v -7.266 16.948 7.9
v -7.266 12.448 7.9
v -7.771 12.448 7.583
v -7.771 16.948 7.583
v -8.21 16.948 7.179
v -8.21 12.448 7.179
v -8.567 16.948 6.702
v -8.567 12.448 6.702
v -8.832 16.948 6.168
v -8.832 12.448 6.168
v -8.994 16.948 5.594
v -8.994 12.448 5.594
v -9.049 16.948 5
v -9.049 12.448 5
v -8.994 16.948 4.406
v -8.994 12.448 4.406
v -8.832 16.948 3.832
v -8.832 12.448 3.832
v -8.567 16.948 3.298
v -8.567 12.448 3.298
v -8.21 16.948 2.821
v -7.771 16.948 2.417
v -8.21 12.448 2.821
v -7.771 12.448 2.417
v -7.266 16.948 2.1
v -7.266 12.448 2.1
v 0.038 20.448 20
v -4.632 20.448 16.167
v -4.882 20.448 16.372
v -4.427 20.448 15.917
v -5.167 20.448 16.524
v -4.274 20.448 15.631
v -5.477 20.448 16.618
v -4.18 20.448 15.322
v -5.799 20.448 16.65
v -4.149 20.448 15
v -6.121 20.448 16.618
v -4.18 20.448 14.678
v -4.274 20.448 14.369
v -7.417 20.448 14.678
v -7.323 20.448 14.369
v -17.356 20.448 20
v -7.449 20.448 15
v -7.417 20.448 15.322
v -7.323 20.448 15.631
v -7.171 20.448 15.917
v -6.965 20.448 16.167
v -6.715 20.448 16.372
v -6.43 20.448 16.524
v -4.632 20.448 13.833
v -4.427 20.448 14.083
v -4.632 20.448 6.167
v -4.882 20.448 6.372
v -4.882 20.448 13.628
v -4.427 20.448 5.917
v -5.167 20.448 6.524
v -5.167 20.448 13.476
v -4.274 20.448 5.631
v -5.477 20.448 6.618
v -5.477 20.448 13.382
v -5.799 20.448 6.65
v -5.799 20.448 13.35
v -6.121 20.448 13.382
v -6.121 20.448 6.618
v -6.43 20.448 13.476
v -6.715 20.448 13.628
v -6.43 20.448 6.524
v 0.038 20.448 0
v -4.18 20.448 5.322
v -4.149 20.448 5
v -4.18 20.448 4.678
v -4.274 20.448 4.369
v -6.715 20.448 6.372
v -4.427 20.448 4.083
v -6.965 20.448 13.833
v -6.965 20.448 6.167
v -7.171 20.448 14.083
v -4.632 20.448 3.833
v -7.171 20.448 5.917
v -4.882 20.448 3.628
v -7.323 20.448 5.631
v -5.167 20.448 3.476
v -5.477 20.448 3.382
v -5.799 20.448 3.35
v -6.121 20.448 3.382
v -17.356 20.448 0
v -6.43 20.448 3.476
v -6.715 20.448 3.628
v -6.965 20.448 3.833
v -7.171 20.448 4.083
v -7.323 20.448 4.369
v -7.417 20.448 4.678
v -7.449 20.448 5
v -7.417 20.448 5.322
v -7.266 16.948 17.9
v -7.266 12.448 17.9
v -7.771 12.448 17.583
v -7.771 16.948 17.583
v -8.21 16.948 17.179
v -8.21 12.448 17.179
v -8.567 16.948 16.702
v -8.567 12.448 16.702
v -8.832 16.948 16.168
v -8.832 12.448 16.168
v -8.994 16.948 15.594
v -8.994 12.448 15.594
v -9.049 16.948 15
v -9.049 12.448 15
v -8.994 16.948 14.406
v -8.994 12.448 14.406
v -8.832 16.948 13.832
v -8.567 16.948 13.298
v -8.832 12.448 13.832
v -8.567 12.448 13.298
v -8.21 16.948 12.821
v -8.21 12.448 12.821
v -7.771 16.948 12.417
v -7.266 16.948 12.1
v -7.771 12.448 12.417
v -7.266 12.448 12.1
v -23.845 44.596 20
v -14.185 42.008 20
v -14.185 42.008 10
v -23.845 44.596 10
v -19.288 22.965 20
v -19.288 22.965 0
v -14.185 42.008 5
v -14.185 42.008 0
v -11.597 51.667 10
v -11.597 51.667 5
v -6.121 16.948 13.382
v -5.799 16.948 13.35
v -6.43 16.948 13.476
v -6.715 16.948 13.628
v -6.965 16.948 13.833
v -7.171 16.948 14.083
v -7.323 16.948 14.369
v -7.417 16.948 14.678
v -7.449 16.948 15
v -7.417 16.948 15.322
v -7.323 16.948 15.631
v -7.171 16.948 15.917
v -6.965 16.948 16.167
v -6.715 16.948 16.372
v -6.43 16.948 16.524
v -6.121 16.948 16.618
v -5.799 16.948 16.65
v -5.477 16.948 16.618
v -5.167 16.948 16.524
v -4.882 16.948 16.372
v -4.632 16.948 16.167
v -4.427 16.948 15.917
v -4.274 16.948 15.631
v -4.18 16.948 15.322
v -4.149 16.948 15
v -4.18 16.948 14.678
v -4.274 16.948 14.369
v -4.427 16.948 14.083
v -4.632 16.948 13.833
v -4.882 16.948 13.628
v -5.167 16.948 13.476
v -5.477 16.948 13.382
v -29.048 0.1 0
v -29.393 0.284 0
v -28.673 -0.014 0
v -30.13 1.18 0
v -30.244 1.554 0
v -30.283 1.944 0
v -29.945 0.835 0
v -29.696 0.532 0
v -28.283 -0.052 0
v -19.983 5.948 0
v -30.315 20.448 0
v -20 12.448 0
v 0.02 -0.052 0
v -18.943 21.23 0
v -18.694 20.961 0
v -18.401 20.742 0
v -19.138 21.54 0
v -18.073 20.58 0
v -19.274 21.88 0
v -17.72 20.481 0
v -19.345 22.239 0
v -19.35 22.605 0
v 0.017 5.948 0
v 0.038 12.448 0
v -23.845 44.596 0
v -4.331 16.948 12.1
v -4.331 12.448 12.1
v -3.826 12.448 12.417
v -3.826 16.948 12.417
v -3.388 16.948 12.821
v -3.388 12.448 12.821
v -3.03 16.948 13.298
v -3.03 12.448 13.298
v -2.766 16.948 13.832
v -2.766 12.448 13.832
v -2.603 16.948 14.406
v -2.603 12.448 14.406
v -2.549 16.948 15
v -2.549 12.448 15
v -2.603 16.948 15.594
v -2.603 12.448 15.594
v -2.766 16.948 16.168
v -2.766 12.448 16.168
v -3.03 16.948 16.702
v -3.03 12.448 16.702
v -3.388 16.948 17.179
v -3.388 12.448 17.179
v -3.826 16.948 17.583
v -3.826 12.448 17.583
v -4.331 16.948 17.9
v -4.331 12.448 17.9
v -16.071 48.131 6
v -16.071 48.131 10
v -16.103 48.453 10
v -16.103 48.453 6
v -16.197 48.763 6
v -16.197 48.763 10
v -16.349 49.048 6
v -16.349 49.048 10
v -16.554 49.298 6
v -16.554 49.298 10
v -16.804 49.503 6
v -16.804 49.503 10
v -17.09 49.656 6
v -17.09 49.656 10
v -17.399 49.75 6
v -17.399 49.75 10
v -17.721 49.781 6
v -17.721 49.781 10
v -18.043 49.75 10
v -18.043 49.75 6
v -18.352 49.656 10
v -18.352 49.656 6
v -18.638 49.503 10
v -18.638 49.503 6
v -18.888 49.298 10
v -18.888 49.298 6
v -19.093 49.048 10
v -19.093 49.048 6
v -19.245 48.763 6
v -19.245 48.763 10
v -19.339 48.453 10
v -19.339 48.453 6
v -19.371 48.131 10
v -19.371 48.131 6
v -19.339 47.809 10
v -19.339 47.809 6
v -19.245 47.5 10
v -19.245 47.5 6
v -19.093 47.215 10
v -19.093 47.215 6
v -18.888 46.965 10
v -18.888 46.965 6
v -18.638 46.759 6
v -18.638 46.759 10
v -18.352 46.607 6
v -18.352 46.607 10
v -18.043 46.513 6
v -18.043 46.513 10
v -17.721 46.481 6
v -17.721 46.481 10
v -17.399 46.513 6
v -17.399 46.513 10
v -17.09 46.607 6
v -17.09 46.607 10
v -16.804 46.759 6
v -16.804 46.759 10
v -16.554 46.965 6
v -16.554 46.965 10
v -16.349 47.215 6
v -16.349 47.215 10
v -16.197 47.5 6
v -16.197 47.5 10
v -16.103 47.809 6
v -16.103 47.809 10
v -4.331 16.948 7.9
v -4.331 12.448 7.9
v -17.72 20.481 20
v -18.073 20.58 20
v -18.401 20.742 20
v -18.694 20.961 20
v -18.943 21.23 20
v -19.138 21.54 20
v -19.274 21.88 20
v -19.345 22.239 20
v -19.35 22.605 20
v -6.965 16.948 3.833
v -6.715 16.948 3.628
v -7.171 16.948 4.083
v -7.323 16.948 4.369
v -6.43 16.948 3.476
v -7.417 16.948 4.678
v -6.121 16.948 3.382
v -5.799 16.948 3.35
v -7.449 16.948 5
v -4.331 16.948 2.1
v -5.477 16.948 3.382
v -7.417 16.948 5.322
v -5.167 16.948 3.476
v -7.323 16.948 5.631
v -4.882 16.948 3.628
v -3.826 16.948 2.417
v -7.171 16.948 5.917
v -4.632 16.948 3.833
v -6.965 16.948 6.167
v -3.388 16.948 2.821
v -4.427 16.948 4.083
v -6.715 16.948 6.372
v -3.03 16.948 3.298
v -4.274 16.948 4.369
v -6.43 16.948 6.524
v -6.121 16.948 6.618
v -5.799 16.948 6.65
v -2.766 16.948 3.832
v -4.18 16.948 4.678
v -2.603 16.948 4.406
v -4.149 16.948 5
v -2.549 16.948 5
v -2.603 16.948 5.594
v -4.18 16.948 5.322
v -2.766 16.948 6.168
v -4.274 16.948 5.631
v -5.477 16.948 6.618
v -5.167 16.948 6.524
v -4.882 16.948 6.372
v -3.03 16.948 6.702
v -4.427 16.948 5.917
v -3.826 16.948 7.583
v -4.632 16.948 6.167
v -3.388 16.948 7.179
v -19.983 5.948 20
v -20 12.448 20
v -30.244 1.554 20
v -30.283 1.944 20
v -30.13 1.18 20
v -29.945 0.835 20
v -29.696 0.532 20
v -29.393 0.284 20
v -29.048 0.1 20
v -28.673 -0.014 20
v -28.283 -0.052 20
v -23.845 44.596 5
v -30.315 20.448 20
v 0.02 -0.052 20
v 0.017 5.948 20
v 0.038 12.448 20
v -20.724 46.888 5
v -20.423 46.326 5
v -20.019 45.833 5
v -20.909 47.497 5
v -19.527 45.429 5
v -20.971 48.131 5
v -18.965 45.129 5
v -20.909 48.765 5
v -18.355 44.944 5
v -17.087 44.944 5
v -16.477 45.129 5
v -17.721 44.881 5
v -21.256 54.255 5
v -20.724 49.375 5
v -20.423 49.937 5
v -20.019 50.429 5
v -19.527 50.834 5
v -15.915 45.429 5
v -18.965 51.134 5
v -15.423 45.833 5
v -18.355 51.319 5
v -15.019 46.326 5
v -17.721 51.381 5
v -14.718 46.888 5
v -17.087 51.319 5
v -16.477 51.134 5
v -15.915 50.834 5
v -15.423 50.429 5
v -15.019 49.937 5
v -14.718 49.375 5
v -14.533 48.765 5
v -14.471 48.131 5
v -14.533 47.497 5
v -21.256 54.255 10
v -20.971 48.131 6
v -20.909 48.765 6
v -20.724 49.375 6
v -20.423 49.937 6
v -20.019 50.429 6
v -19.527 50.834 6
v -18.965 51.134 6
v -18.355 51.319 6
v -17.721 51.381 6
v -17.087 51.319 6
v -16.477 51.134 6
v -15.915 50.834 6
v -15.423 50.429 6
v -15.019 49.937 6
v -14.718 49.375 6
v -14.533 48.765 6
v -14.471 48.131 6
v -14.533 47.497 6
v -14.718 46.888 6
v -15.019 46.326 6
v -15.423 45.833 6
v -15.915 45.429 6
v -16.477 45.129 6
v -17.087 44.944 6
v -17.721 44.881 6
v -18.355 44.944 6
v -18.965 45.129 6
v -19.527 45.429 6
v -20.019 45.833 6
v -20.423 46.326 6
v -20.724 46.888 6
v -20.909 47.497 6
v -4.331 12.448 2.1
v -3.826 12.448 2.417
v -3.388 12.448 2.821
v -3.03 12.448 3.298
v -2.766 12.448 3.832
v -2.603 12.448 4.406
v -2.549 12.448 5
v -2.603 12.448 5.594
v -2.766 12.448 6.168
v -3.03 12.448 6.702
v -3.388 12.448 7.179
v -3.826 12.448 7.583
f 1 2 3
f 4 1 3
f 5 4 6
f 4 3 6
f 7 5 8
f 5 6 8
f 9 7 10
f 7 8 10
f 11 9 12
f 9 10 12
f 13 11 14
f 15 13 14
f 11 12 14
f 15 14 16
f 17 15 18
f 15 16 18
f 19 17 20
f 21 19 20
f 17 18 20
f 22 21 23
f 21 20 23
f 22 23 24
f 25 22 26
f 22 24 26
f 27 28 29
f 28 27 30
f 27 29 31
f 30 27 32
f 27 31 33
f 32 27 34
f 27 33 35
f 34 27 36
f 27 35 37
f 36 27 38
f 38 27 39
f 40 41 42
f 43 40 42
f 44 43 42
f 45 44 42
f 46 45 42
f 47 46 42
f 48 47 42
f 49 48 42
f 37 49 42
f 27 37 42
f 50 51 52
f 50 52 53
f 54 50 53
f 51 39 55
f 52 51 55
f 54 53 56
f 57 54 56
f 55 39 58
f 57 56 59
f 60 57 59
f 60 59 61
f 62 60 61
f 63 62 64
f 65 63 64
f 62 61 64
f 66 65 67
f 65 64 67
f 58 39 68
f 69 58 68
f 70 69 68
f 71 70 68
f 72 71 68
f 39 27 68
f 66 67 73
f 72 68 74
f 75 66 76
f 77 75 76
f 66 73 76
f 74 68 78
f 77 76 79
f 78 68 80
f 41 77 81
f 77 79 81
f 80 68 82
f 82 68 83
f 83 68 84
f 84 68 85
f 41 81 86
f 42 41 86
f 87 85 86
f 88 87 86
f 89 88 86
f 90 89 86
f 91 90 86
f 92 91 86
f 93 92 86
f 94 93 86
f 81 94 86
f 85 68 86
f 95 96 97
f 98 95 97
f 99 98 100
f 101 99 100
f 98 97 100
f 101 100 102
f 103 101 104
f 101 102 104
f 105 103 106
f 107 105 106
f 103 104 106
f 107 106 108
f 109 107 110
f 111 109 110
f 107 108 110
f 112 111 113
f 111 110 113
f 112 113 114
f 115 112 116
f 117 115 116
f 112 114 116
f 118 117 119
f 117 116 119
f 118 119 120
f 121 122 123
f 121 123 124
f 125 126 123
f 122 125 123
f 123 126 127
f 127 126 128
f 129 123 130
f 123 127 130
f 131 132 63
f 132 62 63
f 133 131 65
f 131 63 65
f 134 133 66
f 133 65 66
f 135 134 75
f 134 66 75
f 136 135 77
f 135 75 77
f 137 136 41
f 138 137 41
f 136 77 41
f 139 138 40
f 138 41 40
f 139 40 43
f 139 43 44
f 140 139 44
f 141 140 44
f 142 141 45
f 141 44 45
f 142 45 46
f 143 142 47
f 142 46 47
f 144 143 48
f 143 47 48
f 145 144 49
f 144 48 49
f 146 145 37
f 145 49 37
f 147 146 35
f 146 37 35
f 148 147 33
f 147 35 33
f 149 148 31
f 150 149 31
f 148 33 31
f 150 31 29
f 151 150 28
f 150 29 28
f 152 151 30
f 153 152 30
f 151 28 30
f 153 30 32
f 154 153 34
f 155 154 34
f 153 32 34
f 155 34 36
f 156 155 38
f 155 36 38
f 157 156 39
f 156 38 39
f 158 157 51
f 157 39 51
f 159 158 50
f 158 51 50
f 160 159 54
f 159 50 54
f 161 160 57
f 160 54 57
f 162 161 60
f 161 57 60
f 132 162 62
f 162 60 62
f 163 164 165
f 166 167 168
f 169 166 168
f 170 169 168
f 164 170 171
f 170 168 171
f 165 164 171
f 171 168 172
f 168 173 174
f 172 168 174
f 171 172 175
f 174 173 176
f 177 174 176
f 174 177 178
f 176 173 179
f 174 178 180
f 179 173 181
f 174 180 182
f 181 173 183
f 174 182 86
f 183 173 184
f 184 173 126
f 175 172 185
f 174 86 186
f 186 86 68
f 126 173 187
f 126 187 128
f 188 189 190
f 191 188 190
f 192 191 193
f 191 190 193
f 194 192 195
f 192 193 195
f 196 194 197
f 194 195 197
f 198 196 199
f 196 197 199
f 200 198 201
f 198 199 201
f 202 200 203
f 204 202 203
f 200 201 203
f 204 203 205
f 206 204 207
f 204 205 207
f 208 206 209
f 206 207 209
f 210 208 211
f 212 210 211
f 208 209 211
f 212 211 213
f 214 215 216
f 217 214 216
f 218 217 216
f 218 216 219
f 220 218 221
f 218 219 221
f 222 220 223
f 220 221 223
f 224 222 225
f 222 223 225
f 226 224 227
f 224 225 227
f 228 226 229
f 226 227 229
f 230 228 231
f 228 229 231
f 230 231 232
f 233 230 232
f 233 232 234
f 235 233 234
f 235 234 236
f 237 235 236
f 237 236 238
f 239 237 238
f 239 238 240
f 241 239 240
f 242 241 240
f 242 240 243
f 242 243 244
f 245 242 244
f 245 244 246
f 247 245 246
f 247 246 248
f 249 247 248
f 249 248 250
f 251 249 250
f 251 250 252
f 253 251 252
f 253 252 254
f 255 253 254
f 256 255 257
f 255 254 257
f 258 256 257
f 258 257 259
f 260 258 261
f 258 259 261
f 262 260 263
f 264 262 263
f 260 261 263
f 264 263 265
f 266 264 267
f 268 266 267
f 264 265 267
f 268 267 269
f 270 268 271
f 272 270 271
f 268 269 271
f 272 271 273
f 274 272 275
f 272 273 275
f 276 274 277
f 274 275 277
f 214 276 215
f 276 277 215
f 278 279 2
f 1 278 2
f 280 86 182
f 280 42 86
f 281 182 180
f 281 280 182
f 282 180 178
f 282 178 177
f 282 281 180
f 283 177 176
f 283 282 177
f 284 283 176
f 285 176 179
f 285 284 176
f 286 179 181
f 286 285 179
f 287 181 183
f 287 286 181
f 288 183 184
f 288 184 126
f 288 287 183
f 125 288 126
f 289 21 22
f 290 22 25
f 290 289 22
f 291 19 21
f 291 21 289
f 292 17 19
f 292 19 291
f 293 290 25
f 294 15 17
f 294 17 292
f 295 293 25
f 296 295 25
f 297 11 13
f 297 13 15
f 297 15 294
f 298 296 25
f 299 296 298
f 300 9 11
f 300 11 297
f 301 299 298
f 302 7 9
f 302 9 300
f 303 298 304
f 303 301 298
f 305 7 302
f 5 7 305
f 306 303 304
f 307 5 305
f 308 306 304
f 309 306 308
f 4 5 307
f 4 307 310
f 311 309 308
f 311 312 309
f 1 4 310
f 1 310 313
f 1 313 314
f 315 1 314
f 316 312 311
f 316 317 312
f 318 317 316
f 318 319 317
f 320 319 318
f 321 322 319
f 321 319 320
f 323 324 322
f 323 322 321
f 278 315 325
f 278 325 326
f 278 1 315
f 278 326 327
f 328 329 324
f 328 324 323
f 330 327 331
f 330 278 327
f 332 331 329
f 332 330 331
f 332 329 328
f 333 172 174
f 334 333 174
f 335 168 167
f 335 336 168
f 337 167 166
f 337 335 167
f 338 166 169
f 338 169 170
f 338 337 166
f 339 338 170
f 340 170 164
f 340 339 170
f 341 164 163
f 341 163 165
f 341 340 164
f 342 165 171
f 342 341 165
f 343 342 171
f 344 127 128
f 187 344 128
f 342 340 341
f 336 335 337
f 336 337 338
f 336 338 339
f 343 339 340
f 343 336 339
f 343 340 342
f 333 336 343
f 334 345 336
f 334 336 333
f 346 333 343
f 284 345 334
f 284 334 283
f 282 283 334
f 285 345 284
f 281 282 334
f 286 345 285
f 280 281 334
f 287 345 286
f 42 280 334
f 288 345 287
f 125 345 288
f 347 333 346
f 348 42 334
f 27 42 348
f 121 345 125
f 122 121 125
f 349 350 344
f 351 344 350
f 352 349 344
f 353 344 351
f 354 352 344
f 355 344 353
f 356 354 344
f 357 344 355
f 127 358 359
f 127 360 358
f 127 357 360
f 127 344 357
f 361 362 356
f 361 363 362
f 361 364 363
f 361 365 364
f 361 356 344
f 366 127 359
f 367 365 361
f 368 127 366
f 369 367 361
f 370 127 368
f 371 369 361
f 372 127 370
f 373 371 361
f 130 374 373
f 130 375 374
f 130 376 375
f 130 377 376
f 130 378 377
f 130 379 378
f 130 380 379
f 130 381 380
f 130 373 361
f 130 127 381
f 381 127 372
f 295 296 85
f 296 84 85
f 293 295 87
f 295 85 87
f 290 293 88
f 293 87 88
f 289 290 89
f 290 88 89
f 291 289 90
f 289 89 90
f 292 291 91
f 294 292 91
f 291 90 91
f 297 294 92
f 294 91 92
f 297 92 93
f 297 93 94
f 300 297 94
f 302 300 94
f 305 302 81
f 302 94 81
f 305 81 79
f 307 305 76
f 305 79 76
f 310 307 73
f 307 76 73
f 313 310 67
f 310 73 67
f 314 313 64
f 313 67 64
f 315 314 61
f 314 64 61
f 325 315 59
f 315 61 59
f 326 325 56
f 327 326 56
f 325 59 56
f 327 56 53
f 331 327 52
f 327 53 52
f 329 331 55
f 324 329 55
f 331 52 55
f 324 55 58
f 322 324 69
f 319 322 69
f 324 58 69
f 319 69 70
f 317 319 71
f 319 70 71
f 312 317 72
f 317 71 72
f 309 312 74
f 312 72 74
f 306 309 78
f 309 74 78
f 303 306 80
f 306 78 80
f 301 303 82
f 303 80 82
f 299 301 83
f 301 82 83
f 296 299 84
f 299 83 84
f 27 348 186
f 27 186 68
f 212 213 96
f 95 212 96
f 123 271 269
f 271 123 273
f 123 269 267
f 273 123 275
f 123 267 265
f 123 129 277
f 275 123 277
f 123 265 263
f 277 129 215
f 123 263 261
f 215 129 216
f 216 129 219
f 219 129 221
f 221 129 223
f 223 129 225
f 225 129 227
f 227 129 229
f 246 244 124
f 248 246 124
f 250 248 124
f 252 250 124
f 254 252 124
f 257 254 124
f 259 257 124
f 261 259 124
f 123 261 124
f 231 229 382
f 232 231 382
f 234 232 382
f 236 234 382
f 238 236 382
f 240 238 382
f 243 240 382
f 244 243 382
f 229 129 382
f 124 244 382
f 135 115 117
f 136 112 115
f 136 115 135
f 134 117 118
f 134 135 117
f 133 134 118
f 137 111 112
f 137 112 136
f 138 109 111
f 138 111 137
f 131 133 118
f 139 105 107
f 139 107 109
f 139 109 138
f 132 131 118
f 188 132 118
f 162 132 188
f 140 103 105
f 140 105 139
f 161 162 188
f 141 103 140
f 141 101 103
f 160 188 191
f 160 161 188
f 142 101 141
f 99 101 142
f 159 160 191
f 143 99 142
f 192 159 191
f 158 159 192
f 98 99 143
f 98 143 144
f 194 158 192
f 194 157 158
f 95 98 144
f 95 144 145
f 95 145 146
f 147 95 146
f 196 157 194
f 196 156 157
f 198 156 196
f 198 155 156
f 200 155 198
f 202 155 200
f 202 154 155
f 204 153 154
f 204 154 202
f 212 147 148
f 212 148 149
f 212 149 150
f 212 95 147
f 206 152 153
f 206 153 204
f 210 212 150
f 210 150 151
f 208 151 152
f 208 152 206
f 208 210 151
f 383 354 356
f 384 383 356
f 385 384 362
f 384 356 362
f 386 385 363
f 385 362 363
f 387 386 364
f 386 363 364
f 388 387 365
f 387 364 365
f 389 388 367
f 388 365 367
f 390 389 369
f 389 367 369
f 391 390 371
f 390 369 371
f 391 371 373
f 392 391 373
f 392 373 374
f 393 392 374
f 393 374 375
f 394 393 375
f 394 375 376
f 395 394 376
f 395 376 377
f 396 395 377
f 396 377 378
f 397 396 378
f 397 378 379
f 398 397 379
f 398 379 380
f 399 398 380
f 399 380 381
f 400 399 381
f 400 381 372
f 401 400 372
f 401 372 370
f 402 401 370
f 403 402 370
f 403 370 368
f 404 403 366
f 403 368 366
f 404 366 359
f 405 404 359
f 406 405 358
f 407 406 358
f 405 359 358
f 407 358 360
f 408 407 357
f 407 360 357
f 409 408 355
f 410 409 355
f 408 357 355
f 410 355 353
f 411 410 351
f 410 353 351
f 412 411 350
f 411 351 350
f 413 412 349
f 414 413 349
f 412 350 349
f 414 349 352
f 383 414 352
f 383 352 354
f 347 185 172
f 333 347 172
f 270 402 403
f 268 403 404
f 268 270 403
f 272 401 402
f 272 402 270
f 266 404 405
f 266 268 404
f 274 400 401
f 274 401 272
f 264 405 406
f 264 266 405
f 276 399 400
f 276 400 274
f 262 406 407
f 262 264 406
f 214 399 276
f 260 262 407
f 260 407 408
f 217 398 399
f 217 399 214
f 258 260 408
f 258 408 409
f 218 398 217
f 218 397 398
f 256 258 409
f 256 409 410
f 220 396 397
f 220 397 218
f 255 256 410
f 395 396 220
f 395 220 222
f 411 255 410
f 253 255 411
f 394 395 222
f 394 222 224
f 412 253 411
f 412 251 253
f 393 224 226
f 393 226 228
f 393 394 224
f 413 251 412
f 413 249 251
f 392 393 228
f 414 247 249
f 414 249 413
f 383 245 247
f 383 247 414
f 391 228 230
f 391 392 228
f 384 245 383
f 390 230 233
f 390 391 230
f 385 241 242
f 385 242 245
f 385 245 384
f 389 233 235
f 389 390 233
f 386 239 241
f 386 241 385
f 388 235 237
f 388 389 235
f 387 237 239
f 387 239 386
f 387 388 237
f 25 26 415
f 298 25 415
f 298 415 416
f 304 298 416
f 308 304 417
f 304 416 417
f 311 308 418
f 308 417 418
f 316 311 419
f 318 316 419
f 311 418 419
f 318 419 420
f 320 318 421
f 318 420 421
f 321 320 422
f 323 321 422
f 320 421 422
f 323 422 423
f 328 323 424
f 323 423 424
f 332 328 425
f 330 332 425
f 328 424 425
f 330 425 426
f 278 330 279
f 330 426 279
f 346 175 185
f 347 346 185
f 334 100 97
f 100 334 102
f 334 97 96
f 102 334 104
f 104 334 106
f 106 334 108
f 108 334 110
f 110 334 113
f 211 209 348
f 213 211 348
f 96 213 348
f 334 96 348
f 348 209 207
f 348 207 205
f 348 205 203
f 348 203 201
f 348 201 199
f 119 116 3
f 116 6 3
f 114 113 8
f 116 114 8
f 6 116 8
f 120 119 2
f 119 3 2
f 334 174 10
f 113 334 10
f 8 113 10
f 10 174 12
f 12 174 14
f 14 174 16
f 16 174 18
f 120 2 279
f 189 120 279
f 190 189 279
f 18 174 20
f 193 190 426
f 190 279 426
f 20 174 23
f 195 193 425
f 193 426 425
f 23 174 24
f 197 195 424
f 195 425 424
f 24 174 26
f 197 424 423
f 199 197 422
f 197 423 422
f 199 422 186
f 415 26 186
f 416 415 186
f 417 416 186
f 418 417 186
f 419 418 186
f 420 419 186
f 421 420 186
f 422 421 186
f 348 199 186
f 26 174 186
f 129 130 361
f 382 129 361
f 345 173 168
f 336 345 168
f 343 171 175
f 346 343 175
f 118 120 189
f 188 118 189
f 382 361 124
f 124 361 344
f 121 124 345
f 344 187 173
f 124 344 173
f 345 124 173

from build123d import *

# Parameters (mm, degrees)
EXTRUDE_1_DEPTH             = 20
FILLET_1_R                  = 2
FILLET_2_R                  = 2
CUT_EXTRUDE_2_DEPTH         = 10
SKETCH_34_R                 = 3.25
CUT_EXTRUDE_3_DEPTH         = 6
HOLE_WIZARD_M4_2_D          = 3.3
HOLE_WIZARD_M4_2_DEPTH      = 4
SKETCH_38_W                 = 5
SKETCH_38_H                 = 10
CUT_EXTRUDE_4_DEPTH         = 11
SKETCH_40_W                 = 1.65
SKETCH_40_H                 = 8
HOLE_WIZARD_M4_3_AT_2_COUNT = 2
HOLE_WIZARD_M4_3_AT_2_PITCH = 10
CUT_EXTRUDE_5_DEPTH         = 4.5


with BuildPart() as part:
    # 草图1 → 凸台-拉伸1 (new body)
    with BuildSketch(Plane.XY):
        Polygon((0.020144186, -0.052366179), (0.016918395, 5.947632954), (-19.983081605, 5.947632954), (-20.000068427, 12.447632954), (0.03759791, 12.447632954), (0.03759791, 20.447632954), (-19.96240209, 20.447632954), (-11.597239053, 51.666846423), (-21.256497316, 54.255036874), (-30.315163894, 20.447632954), (-30.279663837, -0.052366179), align=None)
    extrude(amount=EXTRUDE_1_DEPTH)

    # 圆角1
    fillet_1_edges = [part.edges().sort_by_distance(p)[0] for p in [
        (-19.96240209, 20.447632954, 10),
    ]]
    fillet(fillet_1_edges, radius=FILLET_1_R)

    # 圆角2
    fillet_2_edges = [part.edges().sort_by_distance(p)[0] for p in [
        (-30.279663837, -0.052366179, 10),
    ]]
    fillet(fillet_2_edges, radius=FILLET_2_R)

    # 草图33 → 切除-拉伸2 (cut)
    with BuildSketch(Plane.XY.offset(20)):
        Polygon((-21.256497316, 54.255036874), (-11.597239053, 51.666846423), (-14.185429504, 42.00758816), (-23.844687767, 44.595778611), align=None)
    extrude(amount=-CUT_EXTRUDE_2_DEPTH, mode=Mode.SUBTRACT)

    # 草图34 → 切除-拉伸3 (cut)
    with BuildSketch(Plane(origin=(0, 0, 0), x_dir=(-1, 0, 0), z_dir=(0, 0, -1))):
        with Locations((17.72096341, 48.131312517)):
            Circle(SKETCH_34_R)
    extrude(amount=-CUT_EXTRUDE_3_DEPTH, mode=Mode.SUBTRACT)

    # M4 螺纹孔的螺纹孔钻头2
    with Locations(Plane(origin=(0, 0, 6), x_dir=(-1, 0, 0), z_dir=(0, 0, -1))):
        with Locations((17.72096341, 48.131312517)):
            Hole(HOLE_WIZARD_M4_2_D / 2, depth=HOLE_WIZARD_M4_2_DEPTH)

    # 草图38 → 切除-拉伸4 (cut)
    with BuildSketch(Plane(origin=(-23.737082949, 6.360332207, 0), x_dir=(0, 0, -1), z_dir=(0.965925826, -0.258819045, 0))):
        with Locations((-2.5, 41.904754985)):
            Rectangle(SKETCH_38_W, SKETCH_38_H)
    extrude(amount=-CUT_EXTRUDE_4_DEPTH, mode=Mode.SUBTRACT)

    # 草图40 → M4 螺纹孔的螺纹孔钻头3 (revolve, cut)
    with BuildSketch(Plane(origin=(-5.798619526, 12.447632954, 5), x_dir=(0, 0, -1), z_dir=(1, 0, 0))):
        with Locations((0.825, 4)):
            Rectangle(SKETCH_40_W, SKETCH_40_H)
    hole_wizard_m4_3 = revolve(axis=Axis((-5.798619526, 6.097632954, 5), (0, 1, 0)), mode=Mode.SUBTRACT)

    # M4 螺纹孔的螺纹孔钻头3 at 2: M4 螺纹孔的螺纹孔钻头3 ×2
    with Locations(*[(0, 0, i * HOLE_WIZARD_M4_3_AT_2_PITCH) for i in range(1, HOLE_WIZARD_M4_3_AT_2_COUNT)]):
        add(hole_wizard_m4_3, mode=Mode.SUBTRACT)

    # 草图41 → 切除-拉伸5 (cut)
    with BuildSketch(Plane.XZ.offset(-12.447632954)):
        with BuildLine():
            Line((-7.265759602, 12.1), (-4.331479451, 12.1))
            ThreePointArc((-4.331479451, 12.1), (-2.548619526, 15), (-4.331479451, 17.9))
            Line((-4.331479451, 17.9), (-7.265759602, 17.9))
            ThreePointArc((-7.265759602, 17.9), (-9.048619526, 15), (-7.265759602, 12.1))
        make_face()
        with BuildLine():
            Line((-7.265759602, 2.1), (-4.331479451, 2.1))
            ThreePointArc((-4.331479451, 2.1), (-2.548619526, 5), (-4.331479451, 7.9))
            Line((-4.331479451, 7.9), (-7.265759602, 7.9))
            ThreePointArc((-7.265759602, 7.9), (-9.048619526, 5), (-7.265759602, 2.1))
        make_face()
    extrude(amount=-CUT_EXTRUDE_5_DEPTH, mode=Mode.SUBTRACT)


solid = part.part
